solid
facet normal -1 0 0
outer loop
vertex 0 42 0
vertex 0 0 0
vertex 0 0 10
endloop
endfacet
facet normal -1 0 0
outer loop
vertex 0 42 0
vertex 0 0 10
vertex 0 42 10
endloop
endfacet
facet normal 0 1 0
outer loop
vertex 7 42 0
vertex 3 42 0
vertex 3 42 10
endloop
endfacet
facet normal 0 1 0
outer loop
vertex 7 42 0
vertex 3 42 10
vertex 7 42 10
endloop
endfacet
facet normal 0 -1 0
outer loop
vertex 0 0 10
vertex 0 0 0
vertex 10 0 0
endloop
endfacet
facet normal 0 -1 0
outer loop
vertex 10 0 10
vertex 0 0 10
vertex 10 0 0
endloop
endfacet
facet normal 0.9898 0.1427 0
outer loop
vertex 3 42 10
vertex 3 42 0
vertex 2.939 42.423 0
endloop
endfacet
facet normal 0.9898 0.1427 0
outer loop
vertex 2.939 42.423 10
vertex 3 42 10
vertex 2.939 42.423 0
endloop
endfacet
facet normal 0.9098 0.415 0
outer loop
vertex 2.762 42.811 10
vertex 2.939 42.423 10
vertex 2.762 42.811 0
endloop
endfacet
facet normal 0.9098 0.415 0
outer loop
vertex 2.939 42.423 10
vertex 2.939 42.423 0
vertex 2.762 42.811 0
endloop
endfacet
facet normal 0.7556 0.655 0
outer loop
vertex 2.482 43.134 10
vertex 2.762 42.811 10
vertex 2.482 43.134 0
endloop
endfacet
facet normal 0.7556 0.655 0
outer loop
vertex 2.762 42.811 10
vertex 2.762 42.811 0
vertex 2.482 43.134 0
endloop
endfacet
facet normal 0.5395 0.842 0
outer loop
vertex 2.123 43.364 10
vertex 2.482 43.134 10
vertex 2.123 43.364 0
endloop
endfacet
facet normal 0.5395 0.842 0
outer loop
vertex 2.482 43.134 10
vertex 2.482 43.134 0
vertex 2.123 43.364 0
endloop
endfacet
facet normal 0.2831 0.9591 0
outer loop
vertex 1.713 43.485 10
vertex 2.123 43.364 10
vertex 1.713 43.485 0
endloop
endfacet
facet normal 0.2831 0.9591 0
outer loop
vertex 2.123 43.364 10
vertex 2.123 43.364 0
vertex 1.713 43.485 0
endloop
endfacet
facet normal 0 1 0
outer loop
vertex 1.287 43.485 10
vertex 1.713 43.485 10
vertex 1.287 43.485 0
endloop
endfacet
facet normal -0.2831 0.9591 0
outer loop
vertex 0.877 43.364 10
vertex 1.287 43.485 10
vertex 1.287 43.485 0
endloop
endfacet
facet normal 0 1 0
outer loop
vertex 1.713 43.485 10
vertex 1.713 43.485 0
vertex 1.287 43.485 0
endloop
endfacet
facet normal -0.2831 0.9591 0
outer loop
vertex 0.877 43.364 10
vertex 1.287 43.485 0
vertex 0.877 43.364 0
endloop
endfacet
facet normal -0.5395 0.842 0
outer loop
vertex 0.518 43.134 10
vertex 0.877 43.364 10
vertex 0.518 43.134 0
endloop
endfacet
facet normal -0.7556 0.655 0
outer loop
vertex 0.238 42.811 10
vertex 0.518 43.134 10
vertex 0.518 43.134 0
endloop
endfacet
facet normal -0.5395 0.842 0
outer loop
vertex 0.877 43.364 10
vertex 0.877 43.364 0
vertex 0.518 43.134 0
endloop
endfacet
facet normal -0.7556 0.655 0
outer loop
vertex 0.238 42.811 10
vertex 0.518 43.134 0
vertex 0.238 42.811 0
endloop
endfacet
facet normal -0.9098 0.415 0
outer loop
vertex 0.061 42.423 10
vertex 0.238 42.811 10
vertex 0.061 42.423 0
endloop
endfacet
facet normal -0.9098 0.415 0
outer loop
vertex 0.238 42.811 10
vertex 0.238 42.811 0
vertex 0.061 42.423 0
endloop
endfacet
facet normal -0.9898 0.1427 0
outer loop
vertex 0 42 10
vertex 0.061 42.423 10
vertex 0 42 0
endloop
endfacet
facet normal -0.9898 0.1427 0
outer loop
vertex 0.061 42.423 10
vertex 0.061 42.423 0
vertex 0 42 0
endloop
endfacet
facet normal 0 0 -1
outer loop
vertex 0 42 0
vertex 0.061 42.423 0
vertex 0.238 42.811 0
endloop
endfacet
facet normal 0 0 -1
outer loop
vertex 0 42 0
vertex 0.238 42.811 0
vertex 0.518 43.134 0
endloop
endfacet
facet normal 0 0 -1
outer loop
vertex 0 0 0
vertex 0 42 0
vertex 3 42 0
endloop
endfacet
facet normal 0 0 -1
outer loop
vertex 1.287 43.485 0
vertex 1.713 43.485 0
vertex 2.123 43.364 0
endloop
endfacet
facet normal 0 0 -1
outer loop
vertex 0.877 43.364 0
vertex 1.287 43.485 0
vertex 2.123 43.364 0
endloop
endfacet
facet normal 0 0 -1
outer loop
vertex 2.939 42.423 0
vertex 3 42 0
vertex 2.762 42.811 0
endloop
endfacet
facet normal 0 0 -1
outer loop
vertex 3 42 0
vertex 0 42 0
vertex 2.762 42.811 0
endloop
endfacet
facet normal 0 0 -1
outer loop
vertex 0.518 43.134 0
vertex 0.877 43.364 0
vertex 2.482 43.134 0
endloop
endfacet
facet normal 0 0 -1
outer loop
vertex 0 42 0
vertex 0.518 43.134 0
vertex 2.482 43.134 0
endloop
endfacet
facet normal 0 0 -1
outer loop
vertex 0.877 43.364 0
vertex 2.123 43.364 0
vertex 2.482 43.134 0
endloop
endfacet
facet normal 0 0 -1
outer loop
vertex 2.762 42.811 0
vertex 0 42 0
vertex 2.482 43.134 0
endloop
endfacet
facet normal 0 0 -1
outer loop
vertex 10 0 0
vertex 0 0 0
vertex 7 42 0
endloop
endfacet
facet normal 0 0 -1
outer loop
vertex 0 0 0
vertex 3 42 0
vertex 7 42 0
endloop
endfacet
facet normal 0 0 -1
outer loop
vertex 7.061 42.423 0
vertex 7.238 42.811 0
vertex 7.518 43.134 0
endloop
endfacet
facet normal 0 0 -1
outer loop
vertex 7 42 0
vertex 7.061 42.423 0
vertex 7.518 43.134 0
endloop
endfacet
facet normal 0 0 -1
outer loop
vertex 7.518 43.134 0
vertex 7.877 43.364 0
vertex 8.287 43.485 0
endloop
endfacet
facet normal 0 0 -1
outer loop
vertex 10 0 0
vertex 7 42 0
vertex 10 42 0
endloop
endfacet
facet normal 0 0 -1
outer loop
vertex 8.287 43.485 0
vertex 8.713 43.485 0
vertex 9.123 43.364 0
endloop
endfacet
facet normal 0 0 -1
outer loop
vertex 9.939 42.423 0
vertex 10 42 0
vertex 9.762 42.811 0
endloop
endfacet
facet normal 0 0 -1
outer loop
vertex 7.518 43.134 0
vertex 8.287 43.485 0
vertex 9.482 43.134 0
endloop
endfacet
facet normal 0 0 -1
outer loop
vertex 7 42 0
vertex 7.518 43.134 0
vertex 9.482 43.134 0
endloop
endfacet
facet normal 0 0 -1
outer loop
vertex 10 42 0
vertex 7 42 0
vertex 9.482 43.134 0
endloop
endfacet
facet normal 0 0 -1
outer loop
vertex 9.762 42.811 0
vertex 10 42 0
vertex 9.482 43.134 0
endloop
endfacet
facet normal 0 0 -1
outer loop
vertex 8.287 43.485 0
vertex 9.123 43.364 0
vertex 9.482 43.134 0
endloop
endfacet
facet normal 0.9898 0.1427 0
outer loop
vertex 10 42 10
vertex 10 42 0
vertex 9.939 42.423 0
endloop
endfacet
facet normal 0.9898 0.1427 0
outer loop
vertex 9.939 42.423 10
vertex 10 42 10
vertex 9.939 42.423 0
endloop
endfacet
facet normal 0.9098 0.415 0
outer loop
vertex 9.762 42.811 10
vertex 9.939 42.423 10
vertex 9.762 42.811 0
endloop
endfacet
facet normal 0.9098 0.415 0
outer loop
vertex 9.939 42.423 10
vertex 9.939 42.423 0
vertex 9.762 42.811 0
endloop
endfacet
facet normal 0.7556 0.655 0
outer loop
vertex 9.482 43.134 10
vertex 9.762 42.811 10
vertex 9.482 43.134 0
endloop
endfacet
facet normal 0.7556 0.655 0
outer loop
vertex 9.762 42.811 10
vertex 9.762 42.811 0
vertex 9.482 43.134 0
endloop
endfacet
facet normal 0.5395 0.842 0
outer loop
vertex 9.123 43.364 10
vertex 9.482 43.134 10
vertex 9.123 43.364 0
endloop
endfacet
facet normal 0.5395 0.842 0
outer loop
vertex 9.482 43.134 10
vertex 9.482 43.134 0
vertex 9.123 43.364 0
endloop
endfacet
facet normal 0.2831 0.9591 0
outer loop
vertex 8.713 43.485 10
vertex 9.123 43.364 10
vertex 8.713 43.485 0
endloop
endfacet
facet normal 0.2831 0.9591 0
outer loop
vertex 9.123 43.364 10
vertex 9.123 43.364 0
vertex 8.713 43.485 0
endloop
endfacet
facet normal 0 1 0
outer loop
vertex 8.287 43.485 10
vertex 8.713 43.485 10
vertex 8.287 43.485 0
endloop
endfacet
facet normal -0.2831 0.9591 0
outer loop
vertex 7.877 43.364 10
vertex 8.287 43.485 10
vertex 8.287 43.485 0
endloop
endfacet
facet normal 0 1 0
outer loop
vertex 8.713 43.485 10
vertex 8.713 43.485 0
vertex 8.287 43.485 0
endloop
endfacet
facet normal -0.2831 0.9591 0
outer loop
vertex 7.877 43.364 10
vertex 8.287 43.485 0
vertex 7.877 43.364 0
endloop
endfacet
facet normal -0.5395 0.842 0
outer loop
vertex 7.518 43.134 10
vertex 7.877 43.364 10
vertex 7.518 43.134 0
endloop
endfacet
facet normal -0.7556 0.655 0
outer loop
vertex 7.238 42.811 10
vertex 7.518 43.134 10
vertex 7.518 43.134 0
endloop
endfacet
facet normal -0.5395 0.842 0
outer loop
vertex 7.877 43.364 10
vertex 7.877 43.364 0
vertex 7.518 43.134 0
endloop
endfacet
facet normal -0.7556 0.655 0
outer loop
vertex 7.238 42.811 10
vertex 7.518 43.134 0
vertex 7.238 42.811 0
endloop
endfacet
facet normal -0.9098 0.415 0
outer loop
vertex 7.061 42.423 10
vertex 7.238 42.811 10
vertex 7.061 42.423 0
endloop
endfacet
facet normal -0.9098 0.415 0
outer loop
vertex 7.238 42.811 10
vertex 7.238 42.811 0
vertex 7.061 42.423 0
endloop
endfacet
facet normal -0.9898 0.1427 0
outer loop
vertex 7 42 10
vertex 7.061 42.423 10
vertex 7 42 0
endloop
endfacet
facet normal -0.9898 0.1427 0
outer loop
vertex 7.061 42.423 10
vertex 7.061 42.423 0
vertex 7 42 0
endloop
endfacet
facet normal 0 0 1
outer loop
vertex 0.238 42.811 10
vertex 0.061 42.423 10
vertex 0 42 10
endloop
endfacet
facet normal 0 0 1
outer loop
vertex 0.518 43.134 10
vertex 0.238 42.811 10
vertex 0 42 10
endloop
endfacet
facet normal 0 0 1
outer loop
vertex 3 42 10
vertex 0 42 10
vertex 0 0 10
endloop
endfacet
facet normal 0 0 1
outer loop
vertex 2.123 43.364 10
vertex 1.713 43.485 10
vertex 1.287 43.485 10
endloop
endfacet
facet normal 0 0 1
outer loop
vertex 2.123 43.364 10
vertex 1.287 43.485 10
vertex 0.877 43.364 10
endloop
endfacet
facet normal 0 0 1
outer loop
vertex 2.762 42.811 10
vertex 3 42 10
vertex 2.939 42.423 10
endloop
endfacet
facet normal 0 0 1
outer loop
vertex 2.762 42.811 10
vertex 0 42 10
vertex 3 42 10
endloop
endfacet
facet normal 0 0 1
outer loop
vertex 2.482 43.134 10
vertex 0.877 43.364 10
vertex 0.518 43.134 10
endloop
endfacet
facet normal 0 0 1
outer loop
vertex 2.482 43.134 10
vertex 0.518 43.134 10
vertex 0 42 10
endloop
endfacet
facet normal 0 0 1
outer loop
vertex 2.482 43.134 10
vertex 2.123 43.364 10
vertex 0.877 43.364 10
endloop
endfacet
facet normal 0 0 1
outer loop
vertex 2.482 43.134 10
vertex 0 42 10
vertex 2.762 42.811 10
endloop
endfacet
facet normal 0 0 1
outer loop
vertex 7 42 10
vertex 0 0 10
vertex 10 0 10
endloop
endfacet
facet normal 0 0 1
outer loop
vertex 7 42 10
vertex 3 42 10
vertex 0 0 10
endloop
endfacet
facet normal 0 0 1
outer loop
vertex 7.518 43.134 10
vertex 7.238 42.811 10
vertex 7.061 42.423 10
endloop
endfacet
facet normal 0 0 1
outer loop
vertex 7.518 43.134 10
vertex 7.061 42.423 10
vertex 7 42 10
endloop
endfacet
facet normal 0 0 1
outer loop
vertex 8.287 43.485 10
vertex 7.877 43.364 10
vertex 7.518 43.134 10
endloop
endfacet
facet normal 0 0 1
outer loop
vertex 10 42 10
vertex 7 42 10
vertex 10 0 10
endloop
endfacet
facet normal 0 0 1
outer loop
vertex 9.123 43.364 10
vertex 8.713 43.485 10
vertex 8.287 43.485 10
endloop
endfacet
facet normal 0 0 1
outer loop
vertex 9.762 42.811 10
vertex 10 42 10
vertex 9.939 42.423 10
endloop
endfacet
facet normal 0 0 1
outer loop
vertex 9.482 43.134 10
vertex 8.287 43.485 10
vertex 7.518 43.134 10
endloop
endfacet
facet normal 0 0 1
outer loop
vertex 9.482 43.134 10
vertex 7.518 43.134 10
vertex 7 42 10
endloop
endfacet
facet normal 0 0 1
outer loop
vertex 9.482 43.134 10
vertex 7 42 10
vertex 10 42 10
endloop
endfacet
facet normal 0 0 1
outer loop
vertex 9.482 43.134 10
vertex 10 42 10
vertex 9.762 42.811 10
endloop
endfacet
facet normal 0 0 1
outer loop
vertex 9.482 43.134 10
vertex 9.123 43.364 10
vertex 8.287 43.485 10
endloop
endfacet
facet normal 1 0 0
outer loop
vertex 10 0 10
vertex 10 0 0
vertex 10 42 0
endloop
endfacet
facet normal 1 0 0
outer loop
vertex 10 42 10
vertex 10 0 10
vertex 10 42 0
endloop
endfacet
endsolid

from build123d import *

# Parameters (mm, degrees)
CYLINDER001_R     = 1.5
CYLINDER001_DEPTH = 10
CYLINDER002_R     = 1.5
CYLINDER002_DEPTH = 10
BOX_W             = 10
BOX_H             = 42
BOX_DEPTH         = 10


with BuildPart() as zylinder001:
    # Cylinder001 → Cylinder001 (new body)
    with BuildSketch(Plane(origin=(1.5, 42, 0), x_dir=(1, 0, 0), z_dir=(0, 0, 1))):
        Circle(CYLINDER001_R)
    extrude(amount=CYLINDER001_DEPTH)


with BuildPart() as zylinder002:
    # Cylinder002 → Cylinder002 (new body)
    with BuildSketch(Plane(origin=(8.5, 42, 0), x_dir=(1, 0, 0), z_dir=(0, 0, 1))):
        Circle(CYLINDER002_R)
    extrude(amount=CYLINDER002_DEPTH)


with BuildPart() as fusion:
    # Box → Box (new body)
    with BuildSketch(Plane.XY):
        with Locations((5, 21)):
            Rectangle(BOX_W, BOX_H)
    extrude(amount=BOX_DEPTH)

    # Fusion: union Zylinder001, Zylinder002
    add(zylinder001.part)
    add(zylinder002.part)


solid = fusion.part
